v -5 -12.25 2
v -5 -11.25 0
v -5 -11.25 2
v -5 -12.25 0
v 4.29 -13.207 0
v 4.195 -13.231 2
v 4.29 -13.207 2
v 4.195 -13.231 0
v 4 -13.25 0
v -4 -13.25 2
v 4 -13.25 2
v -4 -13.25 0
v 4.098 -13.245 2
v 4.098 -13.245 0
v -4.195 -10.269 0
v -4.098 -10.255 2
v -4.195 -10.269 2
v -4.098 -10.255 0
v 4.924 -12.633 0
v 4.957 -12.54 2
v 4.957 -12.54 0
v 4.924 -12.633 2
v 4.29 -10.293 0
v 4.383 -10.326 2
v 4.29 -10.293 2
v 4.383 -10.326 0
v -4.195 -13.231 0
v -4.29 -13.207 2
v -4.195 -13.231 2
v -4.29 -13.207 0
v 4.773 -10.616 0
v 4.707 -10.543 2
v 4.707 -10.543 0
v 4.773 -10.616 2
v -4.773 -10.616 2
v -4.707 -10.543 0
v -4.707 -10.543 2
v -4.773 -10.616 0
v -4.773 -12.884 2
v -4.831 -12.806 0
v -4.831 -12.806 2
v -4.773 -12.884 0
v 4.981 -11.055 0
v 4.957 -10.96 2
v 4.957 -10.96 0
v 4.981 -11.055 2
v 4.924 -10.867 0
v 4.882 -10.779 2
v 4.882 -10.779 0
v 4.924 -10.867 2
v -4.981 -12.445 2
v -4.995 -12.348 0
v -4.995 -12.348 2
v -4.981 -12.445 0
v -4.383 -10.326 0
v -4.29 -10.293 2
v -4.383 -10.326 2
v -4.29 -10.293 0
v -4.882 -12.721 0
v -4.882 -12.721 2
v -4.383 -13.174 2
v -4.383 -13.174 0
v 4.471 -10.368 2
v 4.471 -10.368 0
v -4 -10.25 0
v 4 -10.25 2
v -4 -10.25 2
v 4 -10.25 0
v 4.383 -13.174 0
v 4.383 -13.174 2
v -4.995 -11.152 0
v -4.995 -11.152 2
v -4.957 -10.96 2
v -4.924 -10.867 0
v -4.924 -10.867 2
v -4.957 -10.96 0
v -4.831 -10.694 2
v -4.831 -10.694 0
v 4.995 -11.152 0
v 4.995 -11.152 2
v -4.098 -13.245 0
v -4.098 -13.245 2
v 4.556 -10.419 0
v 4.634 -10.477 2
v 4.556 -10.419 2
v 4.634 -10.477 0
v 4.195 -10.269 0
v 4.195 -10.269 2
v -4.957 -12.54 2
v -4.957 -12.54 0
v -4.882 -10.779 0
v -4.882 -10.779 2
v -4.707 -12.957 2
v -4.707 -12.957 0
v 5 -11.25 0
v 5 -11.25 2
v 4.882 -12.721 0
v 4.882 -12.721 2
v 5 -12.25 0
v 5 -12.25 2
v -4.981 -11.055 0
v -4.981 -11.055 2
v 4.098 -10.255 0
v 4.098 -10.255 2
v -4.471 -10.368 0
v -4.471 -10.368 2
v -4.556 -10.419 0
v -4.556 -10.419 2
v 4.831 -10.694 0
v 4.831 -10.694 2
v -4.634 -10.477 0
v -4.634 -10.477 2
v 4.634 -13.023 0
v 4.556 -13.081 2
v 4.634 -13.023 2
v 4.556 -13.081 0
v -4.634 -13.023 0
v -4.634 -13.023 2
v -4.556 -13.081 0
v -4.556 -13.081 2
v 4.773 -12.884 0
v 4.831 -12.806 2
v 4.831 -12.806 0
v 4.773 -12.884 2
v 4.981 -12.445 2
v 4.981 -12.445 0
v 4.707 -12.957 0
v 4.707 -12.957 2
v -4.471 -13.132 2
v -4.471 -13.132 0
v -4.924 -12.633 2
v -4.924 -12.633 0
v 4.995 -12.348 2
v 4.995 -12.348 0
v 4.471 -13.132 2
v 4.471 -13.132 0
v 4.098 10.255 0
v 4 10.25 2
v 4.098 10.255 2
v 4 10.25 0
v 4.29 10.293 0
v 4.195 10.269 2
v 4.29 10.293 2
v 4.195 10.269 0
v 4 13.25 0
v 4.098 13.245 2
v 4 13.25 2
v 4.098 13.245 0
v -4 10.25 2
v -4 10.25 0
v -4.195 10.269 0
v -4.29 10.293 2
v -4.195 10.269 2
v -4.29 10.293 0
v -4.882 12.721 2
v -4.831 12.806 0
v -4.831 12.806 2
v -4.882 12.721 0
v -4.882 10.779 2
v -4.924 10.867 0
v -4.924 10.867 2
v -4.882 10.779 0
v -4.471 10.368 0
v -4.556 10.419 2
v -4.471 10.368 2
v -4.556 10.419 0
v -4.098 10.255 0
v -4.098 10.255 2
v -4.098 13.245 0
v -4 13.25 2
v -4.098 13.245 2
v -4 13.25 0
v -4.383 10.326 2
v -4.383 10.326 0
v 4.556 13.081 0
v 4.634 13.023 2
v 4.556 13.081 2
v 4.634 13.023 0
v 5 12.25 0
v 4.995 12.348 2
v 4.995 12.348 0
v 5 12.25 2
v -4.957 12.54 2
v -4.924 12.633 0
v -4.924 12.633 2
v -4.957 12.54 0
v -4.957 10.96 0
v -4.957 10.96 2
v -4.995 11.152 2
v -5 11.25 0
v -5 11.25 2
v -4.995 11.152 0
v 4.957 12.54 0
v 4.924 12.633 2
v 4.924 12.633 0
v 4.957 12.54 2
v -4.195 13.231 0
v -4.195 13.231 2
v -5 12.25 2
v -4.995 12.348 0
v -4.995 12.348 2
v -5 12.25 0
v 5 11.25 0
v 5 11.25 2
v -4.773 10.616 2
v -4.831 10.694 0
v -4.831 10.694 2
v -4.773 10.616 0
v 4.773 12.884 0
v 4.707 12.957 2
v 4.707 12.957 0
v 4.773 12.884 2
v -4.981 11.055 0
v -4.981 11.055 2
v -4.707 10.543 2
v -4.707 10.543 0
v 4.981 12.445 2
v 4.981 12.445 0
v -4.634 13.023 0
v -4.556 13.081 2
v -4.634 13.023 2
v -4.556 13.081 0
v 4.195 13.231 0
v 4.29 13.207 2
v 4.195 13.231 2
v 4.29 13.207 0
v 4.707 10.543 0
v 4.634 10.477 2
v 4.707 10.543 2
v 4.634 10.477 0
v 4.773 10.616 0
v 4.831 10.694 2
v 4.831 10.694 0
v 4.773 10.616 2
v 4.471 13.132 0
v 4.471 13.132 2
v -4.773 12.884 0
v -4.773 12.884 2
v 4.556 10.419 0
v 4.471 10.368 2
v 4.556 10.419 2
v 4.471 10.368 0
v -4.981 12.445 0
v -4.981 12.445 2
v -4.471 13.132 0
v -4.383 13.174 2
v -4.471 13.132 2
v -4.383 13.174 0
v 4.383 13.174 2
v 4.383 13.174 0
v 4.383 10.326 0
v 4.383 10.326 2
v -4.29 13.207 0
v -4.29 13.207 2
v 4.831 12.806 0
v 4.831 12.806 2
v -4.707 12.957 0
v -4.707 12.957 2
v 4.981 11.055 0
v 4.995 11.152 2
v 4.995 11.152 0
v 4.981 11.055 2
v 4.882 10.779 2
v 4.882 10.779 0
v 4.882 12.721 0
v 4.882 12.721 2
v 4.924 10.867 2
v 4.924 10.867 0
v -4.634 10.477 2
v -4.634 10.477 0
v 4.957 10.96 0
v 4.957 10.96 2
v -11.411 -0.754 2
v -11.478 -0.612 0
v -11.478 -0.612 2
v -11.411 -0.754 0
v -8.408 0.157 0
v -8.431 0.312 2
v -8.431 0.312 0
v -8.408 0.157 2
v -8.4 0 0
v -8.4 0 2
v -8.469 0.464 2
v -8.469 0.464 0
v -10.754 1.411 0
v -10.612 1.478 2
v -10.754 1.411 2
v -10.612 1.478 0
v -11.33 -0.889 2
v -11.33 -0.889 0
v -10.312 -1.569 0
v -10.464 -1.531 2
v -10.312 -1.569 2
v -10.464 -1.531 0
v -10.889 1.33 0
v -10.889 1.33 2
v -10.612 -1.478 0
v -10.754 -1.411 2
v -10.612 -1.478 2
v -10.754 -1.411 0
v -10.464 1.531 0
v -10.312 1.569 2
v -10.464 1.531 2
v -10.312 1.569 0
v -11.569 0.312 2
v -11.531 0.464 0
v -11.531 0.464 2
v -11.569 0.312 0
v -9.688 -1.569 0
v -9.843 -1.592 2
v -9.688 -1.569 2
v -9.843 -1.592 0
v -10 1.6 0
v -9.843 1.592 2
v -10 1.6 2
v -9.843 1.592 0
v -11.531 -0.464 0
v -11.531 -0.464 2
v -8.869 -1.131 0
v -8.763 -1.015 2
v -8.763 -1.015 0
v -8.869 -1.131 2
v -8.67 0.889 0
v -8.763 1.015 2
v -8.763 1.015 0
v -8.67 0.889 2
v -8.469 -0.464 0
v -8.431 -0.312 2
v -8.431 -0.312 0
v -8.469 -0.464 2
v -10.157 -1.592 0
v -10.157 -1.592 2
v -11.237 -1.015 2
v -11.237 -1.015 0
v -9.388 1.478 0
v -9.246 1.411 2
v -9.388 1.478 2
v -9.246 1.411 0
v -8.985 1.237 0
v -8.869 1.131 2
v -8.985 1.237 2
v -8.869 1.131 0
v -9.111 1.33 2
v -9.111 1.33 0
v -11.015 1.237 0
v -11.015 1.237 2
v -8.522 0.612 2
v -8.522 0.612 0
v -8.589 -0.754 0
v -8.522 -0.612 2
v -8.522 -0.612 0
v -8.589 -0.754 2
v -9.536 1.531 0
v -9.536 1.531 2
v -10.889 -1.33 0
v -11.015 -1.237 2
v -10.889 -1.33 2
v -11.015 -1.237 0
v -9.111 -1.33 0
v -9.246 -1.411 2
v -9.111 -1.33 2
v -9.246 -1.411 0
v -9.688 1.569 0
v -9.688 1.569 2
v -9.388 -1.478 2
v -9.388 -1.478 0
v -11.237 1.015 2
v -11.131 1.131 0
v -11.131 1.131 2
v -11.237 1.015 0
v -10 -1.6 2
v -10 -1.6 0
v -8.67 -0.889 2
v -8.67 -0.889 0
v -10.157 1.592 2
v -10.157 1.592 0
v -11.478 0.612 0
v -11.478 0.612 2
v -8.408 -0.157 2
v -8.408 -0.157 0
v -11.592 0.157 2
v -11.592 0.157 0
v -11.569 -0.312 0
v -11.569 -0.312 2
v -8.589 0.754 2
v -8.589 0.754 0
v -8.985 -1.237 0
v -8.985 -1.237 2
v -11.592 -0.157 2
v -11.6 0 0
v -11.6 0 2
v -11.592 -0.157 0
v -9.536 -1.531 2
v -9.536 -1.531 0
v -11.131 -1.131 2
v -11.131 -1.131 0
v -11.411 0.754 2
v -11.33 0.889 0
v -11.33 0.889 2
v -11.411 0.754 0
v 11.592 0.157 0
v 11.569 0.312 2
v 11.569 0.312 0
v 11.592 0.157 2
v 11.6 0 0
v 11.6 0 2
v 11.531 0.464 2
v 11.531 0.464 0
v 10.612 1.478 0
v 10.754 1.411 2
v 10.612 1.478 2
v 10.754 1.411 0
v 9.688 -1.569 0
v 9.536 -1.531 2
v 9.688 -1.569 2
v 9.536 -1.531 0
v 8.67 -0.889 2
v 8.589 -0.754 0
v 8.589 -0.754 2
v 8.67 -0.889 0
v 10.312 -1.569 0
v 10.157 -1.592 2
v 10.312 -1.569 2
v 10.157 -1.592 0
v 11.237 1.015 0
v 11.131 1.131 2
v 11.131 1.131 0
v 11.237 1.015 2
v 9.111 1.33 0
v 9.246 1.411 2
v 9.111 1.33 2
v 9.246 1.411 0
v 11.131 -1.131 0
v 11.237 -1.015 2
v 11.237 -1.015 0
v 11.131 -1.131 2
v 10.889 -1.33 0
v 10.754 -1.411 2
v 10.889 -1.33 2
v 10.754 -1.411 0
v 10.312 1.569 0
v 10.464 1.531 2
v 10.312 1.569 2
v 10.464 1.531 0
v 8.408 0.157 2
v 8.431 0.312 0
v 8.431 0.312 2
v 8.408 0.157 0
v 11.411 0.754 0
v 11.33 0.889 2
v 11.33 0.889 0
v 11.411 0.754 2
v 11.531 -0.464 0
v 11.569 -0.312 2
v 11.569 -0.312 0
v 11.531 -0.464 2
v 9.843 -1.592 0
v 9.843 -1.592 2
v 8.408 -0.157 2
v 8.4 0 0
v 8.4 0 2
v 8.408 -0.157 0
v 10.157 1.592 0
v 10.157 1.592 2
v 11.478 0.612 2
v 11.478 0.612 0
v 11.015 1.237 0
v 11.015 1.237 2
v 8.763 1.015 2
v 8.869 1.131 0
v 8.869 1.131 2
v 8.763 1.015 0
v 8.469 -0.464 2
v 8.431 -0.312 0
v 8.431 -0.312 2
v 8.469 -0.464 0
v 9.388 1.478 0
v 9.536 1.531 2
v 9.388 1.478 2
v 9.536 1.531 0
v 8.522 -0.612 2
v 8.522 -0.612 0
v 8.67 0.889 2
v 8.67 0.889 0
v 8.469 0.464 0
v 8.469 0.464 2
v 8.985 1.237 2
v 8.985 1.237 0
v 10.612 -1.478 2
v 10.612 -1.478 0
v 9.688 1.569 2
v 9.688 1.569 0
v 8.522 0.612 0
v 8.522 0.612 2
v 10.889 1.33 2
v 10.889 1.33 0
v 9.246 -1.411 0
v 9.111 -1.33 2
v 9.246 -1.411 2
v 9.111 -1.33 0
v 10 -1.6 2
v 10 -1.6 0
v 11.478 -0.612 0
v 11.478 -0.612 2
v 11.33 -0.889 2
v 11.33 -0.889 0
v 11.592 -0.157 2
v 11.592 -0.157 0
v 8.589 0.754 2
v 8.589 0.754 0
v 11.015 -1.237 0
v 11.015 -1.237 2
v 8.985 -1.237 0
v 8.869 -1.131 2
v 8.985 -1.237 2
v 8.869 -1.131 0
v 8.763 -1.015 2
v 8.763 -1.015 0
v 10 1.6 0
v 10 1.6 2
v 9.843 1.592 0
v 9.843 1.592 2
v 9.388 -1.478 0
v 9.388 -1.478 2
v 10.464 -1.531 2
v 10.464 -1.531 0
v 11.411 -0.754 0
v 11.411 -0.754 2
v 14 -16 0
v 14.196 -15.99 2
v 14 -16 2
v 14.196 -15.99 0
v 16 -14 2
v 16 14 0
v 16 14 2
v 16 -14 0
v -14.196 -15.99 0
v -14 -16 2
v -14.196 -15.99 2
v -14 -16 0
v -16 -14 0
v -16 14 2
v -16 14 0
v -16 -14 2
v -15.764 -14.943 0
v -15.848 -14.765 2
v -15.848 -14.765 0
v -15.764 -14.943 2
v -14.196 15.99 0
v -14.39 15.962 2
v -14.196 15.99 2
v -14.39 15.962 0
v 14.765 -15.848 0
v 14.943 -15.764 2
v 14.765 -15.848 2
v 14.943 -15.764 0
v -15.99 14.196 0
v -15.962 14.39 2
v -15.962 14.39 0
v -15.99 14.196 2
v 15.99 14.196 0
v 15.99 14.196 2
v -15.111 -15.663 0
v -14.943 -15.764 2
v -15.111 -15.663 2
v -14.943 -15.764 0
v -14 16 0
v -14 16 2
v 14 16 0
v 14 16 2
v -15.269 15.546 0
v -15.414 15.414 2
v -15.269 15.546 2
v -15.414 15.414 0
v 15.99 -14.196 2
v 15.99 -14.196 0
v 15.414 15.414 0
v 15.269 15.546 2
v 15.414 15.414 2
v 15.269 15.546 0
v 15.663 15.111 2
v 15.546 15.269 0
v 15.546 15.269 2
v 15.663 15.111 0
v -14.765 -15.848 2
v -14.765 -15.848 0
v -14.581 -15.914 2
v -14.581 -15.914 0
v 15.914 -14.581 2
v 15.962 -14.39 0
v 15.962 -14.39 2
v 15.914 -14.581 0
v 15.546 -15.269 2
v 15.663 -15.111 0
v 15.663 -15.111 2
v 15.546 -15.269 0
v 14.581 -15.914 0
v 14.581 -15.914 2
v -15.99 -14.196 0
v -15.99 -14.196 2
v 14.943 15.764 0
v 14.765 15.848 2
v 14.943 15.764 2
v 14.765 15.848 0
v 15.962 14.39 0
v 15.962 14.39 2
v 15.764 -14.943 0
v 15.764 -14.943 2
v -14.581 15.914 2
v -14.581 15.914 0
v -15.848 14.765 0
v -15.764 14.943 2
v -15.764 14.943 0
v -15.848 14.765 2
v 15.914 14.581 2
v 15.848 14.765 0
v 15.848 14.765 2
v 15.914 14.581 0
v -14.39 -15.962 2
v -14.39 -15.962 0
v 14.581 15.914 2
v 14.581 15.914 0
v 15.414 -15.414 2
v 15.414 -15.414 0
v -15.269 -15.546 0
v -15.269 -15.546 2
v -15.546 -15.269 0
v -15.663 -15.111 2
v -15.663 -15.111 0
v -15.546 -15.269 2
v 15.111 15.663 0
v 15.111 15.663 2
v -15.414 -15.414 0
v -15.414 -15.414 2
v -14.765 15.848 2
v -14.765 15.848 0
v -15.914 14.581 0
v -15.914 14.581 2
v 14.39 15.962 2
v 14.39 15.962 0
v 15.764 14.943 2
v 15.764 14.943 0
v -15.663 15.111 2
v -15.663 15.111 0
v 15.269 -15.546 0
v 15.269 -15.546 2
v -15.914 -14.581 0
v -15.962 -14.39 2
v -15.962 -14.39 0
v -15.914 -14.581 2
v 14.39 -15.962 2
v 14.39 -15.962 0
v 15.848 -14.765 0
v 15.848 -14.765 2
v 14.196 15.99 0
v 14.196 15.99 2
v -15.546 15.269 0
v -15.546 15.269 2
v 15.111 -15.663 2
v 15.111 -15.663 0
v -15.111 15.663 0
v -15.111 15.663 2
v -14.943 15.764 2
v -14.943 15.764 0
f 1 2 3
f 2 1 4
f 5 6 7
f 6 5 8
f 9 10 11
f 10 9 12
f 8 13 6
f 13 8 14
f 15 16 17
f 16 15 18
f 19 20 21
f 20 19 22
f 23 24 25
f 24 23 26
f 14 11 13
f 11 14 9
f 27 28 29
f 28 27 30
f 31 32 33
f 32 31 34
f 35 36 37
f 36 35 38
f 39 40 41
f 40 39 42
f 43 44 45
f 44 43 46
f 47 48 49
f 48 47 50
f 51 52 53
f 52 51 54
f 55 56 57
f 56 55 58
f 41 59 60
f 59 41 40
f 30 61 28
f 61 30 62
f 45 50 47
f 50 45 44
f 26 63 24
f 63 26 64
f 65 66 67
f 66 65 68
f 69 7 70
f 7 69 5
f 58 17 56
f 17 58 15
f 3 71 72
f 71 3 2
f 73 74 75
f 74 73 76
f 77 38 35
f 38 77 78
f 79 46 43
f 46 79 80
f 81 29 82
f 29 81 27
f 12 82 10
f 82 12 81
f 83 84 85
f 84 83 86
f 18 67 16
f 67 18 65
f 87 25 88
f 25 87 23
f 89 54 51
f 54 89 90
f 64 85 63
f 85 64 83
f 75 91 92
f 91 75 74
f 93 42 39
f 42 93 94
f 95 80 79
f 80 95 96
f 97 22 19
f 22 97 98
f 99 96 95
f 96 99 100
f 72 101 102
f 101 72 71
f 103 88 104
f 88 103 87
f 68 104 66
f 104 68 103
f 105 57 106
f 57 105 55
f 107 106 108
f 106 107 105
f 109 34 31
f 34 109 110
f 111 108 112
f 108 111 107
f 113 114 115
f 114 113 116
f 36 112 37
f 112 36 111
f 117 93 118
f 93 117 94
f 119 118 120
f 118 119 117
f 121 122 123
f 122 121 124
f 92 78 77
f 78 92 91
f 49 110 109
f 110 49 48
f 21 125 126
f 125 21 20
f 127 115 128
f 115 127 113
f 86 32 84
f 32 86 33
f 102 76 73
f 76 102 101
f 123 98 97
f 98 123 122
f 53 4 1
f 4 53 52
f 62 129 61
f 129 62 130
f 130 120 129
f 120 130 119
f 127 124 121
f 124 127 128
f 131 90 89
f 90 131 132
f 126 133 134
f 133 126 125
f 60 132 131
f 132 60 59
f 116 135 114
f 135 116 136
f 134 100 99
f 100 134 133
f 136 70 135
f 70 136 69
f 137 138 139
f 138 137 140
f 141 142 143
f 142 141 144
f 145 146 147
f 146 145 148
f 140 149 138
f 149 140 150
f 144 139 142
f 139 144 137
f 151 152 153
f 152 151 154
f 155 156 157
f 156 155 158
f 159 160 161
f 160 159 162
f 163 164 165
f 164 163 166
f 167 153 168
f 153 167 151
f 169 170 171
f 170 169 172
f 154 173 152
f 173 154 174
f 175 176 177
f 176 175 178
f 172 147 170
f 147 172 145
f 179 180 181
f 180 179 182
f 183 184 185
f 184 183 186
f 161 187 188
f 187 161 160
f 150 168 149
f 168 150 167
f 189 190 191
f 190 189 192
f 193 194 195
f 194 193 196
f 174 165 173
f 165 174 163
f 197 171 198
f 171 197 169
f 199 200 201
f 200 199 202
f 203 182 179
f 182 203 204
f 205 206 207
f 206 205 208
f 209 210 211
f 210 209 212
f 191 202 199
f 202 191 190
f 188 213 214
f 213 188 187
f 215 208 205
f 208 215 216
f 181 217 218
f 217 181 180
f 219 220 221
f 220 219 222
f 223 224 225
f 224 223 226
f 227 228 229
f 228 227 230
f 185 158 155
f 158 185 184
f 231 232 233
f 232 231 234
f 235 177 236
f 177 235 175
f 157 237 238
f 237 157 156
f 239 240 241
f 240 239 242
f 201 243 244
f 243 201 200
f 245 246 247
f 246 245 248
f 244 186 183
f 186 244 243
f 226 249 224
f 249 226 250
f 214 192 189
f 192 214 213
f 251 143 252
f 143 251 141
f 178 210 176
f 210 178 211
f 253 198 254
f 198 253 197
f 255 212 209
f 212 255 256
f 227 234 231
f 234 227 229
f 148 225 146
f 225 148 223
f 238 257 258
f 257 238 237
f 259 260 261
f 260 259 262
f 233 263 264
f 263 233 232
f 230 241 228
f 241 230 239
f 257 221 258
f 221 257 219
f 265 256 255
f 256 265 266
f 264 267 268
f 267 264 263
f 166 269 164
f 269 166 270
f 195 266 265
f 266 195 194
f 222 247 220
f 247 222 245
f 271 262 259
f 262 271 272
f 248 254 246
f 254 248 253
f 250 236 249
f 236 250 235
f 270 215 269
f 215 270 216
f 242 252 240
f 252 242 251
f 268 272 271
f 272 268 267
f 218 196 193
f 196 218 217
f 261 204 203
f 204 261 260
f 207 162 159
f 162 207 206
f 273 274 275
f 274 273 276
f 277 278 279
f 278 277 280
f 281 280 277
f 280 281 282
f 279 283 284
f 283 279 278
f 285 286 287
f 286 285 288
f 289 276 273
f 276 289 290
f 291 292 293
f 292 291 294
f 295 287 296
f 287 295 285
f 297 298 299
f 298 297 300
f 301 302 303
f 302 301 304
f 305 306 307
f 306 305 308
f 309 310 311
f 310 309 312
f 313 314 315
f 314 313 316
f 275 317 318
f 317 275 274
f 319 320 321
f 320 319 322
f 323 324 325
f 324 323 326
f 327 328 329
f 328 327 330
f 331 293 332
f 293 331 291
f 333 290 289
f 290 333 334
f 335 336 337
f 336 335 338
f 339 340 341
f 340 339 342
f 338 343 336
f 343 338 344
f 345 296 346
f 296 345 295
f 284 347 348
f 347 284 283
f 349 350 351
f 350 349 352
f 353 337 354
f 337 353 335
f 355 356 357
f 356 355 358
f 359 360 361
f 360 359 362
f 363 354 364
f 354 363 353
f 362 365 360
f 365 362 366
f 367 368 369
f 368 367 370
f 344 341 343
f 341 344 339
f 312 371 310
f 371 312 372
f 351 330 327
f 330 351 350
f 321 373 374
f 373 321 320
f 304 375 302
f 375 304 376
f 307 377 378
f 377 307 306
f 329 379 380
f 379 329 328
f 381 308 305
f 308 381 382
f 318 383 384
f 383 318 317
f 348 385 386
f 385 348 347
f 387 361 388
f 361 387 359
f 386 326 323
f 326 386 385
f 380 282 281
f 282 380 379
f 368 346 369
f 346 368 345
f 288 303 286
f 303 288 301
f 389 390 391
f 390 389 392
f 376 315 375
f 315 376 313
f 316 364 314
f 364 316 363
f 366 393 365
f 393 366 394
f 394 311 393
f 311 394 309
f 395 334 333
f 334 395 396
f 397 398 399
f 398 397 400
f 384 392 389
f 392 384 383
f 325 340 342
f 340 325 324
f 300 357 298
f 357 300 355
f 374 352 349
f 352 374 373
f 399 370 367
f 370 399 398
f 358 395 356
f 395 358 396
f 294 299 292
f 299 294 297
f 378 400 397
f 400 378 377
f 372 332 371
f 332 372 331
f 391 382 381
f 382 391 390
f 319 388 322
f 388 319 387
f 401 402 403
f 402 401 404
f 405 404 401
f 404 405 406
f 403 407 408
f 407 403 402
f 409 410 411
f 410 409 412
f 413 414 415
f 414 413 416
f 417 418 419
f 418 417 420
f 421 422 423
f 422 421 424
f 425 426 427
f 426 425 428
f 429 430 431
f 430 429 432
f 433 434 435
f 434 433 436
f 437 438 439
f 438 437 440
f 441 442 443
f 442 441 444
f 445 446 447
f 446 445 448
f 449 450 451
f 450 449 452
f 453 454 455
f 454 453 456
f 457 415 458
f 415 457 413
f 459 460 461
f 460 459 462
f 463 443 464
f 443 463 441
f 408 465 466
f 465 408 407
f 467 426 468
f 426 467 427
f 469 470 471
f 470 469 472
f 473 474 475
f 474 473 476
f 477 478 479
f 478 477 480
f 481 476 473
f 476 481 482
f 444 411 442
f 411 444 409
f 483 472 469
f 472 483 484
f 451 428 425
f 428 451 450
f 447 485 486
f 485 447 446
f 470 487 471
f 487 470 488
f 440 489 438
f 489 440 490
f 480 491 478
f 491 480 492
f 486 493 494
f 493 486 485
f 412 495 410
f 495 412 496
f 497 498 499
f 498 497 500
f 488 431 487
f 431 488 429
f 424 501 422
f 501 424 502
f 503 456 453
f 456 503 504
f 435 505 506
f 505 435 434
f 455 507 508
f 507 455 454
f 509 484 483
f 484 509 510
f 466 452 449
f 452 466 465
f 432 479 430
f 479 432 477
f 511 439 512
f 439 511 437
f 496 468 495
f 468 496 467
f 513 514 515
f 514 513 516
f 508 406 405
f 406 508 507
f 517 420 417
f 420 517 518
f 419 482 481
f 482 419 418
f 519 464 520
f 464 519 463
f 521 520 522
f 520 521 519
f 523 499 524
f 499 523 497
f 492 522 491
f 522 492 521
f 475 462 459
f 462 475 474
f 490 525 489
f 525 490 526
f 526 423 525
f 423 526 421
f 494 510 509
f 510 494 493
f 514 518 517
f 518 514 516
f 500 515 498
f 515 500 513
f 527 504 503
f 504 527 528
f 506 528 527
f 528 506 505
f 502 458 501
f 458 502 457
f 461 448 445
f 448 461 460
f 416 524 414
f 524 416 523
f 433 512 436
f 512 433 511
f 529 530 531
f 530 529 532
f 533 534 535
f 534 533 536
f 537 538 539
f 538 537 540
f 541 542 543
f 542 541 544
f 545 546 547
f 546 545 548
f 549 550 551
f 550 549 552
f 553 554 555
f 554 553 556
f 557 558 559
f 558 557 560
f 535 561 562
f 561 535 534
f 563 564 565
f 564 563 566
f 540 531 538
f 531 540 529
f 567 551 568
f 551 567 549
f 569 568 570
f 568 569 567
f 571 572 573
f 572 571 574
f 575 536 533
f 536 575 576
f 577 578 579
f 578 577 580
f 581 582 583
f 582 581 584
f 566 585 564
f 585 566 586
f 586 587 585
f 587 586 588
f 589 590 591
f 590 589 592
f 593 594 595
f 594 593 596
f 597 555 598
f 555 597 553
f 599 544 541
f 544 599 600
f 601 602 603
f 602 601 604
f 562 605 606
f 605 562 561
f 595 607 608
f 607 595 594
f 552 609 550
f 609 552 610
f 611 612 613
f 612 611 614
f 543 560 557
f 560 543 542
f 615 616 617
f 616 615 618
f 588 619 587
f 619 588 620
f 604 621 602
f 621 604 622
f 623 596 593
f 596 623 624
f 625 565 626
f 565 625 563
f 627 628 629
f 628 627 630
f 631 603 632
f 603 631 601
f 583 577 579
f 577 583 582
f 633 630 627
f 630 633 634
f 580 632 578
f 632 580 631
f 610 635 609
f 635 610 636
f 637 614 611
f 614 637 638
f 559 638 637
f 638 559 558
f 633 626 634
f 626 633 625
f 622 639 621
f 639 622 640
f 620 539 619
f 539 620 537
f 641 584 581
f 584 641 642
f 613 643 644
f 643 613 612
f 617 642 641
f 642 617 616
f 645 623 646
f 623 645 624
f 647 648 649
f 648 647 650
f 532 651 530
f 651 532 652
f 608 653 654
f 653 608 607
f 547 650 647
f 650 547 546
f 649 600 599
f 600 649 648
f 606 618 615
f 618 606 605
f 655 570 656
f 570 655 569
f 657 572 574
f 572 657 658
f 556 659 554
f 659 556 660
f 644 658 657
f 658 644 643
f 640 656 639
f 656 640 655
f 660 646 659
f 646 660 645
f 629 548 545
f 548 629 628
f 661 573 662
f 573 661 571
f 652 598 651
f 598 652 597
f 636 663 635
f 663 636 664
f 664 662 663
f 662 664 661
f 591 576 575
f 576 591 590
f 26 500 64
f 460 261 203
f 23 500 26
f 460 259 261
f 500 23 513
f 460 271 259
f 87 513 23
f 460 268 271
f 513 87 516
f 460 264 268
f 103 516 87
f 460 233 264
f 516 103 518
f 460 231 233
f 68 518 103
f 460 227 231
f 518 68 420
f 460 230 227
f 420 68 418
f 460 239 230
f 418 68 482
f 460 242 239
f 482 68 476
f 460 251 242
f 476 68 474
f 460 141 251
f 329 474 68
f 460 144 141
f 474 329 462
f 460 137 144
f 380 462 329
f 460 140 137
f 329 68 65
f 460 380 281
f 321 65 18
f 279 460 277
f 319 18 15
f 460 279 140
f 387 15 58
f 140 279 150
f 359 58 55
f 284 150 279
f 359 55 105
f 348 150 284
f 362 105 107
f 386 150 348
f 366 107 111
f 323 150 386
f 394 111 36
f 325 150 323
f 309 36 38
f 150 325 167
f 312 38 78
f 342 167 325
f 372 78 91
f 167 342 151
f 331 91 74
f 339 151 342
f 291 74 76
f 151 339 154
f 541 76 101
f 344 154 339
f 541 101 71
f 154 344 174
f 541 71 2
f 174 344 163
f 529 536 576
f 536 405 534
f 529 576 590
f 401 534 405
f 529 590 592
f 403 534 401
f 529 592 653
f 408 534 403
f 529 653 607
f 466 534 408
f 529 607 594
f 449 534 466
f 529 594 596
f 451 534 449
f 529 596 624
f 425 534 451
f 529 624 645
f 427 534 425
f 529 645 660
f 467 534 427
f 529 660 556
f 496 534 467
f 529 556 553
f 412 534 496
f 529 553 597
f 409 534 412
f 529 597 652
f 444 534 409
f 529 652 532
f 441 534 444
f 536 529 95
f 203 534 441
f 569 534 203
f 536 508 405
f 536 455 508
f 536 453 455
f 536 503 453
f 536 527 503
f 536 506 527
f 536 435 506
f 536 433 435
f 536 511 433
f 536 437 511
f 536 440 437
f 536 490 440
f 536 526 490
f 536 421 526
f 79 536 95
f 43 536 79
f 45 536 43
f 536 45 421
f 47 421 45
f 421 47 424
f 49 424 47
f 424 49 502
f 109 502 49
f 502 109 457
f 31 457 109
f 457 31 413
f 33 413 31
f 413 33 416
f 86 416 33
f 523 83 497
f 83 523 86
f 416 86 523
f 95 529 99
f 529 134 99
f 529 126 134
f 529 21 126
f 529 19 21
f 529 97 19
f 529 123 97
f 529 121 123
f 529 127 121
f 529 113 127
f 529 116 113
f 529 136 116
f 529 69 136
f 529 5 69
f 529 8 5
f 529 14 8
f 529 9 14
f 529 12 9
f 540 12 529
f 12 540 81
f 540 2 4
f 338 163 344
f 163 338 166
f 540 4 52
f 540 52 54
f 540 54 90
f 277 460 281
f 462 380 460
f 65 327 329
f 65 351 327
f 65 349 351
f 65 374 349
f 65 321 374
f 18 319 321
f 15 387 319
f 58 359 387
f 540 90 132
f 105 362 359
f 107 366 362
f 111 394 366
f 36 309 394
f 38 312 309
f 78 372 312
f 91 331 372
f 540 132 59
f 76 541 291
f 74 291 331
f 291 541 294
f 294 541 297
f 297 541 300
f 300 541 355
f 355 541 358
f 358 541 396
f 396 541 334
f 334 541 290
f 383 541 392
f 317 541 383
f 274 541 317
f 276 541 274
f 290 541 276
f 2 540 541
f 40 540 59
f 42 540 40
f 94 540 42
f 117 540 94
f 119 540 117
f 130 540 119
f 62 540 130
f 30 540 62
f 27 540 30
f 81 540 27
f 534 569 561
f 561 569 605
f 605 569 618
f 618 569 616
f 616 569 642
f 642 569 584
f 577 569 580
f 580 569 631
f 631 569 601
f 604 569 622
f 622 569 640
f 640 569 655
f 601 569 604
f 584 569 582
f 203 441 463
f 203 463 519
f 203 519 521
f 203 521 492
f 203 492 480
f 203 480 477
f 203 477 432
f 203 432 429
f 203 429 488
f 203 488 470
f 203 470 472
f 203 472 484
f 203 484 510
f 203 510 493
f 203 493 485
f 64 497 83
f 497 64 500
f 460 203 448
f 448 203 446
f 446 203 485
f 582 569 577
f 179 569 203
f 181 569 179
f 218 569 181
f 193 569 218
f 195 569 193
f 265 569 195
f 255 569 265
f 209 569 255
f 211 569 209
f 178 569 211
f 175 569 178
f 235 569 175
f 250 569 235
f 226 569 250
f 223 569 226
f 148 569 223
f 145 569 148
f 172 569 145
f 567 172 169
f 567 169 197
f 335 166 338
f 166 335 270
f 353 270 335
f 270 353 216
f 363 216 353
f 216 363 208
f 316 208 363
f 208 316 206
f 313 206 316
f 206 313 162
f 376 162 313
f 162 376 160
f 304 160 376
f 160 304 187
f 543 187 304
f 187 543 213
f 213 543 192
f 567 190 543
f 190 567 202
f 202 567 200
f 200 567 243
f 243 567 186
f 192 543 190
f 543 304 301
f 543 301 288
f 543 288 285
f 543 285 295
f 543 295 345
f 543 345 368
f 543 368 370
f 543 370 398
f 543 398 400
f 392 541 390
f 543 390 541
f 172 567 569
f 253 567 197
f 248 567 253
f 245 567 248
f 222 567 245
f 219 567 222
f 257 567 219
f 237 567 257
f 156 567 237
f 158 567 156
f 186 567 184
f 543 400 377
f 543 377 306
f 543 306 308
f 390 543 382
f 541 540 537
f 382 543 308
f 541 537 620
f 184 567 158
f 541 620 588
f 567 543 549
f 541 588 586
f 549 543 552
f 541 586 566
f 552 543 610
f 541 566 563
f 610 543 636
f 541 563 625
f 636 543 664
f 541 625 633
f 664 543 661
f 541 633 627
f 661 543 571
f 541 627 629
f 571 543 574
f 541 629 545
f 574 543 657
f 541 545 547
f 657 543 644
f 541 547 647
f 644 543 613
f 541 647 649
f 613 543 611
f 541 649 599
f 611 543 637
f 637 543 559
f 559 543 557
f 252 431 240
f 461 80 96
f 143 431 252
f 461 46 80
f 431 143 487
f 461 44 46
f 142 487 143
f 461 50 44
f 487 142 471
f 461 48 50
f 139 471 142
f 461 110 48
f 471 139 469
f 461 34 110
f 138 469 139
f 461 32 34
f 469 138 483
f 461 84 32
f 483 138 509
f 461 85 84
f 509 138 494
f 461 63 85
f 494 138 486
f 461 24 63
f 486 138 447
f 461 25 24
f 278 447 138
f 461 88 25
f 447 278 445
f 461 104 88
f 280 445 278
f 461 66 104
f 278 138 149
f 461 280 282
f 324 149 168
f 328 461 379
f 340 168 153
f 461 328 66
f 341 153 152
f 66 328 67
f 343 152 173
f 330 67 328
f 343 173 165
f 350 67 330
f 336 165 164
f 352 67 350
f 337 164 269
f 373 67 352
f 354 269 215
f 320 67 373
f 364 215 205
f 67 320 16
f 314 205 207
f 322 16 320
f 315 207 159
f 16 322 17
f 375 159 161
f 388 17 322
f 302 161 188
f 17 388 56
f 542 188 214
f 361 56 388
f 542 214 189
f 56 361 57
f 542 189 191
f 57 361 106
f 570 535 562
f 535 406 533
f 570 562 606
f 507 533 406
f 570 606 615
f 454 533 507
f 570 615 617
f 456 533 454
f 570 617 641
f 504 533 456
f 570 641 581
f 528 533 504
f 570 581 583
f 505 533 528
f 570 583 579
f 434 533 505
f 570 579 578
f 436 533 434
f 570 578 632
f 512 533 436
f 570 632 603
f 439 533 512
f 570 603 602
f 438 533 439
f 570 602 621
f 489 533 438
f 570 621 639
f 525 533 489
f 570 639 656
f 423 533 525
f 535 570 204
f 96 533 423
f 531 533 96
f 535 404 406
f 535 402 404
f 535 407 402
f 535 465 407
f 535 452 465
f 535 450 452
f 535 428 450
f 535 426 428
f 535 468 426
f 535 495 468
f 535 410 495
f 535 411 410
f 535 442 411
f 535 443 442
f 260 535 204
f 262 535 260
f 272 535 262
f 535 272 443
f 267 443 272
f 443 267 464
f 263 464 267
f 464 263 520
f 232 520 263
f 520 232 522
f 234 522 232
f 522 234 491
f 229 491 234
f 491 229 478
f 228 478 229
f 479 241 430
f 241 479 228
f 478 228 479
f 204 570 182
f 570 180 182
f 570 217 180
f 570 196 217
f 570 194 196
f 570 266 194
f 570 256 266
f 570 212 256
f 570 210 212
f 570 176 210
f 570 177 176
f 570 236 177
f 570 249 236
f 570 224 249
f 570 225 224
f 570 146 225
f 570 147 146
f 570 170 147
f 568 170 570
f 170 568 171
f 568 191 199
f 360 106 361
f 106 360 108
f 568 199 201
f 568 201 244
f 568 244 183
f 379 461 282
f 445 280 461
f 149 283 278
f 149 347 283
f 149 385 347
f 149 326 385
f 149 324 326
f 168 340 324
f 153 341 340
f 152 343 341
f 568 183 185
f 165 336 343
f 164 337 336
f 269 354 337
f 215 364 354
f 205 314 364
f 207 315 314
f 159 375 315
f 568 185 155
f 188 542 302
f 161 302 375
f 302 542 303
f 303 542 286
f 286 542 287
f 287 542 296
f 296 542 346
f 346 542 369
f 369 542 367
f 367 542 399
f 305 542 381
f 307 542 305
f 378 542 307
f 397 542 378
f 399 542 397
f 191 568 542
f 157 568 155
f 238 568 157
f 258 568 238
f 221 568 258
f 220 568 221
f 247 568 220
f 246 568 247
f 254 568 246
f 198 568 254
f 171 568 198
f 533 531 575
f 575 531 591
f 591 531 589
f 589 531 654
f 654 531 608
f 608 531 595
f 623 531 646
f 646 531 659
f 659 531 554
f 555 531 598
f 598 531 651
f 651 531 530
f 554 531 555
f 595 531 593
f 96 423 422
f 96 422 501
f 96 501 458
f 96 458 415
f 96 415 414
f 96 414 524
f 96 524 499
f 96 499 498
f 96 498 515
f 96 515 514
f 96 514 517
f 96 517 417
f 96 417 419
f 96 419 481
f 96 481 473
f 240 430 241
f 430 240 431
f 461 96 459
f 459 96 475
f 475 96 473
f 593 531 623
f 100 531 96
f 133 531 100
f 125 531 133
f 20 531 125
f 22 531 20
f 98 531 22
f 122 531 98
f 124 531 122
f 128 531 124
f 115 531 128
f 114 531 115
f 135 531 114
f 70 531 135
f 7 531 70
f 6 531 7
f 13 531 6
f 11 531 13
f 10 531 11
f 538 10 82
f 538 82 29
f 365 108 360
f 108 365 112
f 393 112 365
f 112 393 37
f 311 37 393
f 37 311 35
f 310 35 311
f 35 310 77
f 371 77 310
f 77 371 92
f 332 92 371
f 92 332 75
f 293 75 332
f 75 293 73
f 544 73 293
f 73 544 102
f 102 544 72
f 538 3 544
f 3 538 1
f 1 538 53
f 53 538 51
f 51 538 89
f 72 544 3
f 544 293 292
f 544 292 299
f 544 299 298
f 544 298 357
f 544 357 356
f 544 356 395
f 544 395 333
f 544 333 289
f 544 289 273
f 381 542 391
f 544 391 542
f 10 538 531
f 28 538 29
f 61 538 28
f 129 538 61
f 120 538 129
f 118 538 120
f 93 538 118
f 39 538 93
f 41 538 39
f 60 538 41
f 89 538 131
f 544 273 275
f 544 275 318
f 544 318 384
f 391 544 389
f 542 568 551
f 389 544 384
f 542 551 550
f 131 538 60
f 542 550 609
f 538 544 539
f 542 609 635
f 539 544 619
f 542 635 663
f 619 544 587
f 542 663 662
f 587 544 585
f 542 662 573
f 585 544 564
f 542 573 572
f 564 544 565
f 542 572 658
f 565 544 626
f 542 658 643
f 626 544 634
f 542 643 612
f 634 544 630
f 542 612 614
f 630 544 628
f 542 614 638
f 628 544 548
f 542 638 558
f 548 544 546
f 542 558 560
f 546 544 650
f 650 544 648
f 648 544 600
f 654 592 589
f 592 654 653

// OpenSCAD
// file: ../lib/util.scad
// =============================================================================
// lib/util.scad — reusable 2D/3D helpers. All "cutter" modules are sized to
// over-shoot in Z so callers can subtract them cleanly; callers position them.
// Self-contained: `use <util.scad>` imports only modules, not variables, so we
// define our own over-cut constant here rather than relying on params.scad.
// =============================================================================

eps = 0.05;   // local over-cut for clean boolean subtractions

// ---- 2D primitives ----------------------------------------------------------

// Rounded rectangle centered at origin. r=0 -> sharp corners.
module rounded_rect(w, d, r = 0) {
    if (r > 0)
        offset(r = r) square([max(0.01, w - 2*r), max(0.01, d - 2*r)], center = true);
    else
        square([w, d], center = true);
}

// Isosceles trapezoid centered at origin: width w1 at the -X end, w2 at the +X
// end, length l along X. Used for the dovetail arm root + its mating pocket so
// the two always share one profile (call with +clearance for the pocket).
module trapezoid_2d(w1, w2, l) {
    polygon([[-l/2, -w1/2], [-l/2, w1/2], [l/2, w2/2], [l/2, -w2/2]]);
}

// Stadium slot: length l along X, width w along Y, fully rounded ends.
module slot_2d(l, w) {
    r = w / 2;
    hull() {
        translate([-(l/2 - r), 0]) circle(r = r);
        translate([ (l/2 - r), 0]) circle(r = r);
    }
}

// Inset-fillet a 2D shape: rounds BOTH convex and concave corners by radius r.
// Used for the arm root where the body blends into the clamp pad.
module fillet_2d(r) {
    offset(r = r) offset(delta = -r) children();
}

// ---- 3D solids --------------------------------------------------------------

// Flat plate: rounded rectangle, centered in XY, base on z=0.
module rounded_plate(w, d, h, r = 0) {
    linear_extrude(height = h) rounded_rect(w, d, r);
}

// ---- Cutters (subtract these) ----------------------------------------------

// Single through-hole, base on z=0, height h (caller lifts by -eps and pads h).
module hole(d, h) {
    translate([0, 0, -eps]) cylinder(d = d, h = h + 2*eps);
}

// 4-hole rectangular bolt pattern, spacing dx by dy, through a part of height h.
module bolt_grid(dx, dy, d, h) {
    for (x = [-dx/2, dx/2], y = [-dy/2, dy/2])
        translate([x, y, 0]) hole(d, h);
}

// 2-hole pair separated by `sep` along X (used for arm clamp / mast / cam).
module bolt_pair(sep, d, h) {
    for (x = [-sep/2, sep/2]) translate([x, 0, 0]) hole(d, h);
}

// Rounded-end through slot, length l along X.
module slot_cut(l, w, h) {
    translate([0, 0, -eps]) linear_extrude(height = h + 2*eps) slot_2d(l, w);
}

// Rectangular through cutout (window / strap slot), optional corner radius.
module rect_cut(l, w, h, r = 0) {
    translate([0, 0, -eps]) linear_extrude(height = h + 2*eps) rounded_rect(l, w, r);
}

// Shallow rectangular pocket cut DOWNWARD from the top face at z = top_z.
module pocket(l, w, depth, top_z, r = 0) {
    translate([0, 0, top_z - depth])
        linear_extrude(height = depth + eps) rounded_rect(l, w, r);
}

// Recess an arbitrary 2D child profile DOWN from the top face at z = top_z.
module recess_top(depth, top_z) {
    translate([0, 0, top_z - depth])
        linear_extrude(height = depth + eps) children();
}

// Recess an arbitrary 2D child profile UP from the bottom face (z = 0).
module recess_bottom(depth) {
    translate([0, 0, -eps])
        linear_extrude(height = depth + eps) children();
}

// Sensor-board seat: a rounded recess (captures the board by geometry, matching
// its rounded corners) plus two through mounting holes on the centerline.
// Subtract from a carrier of total thickness `h_total`, top face at `top_z`.
module board_cradle(l, w, r, depth, top_z, hole_d, hole_sep, h_total) {
    recess_top(depth, top_z) rounded_rect(l, w, r);
    for (x = [-hole_sep/2, hole_sep/2]) translate([x, 0, 0]) hole(hole_d, h_total);
}
// main file
// Part 8a — GPS Plate (mounts on top of the mast)
// 32 x 32 x 2. Zip-tie slots retain the GPS module; 2x M3 bolt it to the top
// mast adapter.
include <../params.scad>
use <../lib/util.scad>

module gps_plate() {
    difference() {
        rounded_plate(gps_plate, gps_plate, gps_plate_t, slot_corner_r);

        // Zip-tie slots straddling the GPS module
        for (s = [-1, 1])
            translate([0, s * (gps_board/2 - 1), 0])
                rect_cut(gps_zip_l, gps_zip_w, gps_plate_t, 1);

        // Bolts to the top mast adapter
        bolt_pair(gps_mast_sep, m3_clear, gps_plate_t);
    }
}

gps_plate();
